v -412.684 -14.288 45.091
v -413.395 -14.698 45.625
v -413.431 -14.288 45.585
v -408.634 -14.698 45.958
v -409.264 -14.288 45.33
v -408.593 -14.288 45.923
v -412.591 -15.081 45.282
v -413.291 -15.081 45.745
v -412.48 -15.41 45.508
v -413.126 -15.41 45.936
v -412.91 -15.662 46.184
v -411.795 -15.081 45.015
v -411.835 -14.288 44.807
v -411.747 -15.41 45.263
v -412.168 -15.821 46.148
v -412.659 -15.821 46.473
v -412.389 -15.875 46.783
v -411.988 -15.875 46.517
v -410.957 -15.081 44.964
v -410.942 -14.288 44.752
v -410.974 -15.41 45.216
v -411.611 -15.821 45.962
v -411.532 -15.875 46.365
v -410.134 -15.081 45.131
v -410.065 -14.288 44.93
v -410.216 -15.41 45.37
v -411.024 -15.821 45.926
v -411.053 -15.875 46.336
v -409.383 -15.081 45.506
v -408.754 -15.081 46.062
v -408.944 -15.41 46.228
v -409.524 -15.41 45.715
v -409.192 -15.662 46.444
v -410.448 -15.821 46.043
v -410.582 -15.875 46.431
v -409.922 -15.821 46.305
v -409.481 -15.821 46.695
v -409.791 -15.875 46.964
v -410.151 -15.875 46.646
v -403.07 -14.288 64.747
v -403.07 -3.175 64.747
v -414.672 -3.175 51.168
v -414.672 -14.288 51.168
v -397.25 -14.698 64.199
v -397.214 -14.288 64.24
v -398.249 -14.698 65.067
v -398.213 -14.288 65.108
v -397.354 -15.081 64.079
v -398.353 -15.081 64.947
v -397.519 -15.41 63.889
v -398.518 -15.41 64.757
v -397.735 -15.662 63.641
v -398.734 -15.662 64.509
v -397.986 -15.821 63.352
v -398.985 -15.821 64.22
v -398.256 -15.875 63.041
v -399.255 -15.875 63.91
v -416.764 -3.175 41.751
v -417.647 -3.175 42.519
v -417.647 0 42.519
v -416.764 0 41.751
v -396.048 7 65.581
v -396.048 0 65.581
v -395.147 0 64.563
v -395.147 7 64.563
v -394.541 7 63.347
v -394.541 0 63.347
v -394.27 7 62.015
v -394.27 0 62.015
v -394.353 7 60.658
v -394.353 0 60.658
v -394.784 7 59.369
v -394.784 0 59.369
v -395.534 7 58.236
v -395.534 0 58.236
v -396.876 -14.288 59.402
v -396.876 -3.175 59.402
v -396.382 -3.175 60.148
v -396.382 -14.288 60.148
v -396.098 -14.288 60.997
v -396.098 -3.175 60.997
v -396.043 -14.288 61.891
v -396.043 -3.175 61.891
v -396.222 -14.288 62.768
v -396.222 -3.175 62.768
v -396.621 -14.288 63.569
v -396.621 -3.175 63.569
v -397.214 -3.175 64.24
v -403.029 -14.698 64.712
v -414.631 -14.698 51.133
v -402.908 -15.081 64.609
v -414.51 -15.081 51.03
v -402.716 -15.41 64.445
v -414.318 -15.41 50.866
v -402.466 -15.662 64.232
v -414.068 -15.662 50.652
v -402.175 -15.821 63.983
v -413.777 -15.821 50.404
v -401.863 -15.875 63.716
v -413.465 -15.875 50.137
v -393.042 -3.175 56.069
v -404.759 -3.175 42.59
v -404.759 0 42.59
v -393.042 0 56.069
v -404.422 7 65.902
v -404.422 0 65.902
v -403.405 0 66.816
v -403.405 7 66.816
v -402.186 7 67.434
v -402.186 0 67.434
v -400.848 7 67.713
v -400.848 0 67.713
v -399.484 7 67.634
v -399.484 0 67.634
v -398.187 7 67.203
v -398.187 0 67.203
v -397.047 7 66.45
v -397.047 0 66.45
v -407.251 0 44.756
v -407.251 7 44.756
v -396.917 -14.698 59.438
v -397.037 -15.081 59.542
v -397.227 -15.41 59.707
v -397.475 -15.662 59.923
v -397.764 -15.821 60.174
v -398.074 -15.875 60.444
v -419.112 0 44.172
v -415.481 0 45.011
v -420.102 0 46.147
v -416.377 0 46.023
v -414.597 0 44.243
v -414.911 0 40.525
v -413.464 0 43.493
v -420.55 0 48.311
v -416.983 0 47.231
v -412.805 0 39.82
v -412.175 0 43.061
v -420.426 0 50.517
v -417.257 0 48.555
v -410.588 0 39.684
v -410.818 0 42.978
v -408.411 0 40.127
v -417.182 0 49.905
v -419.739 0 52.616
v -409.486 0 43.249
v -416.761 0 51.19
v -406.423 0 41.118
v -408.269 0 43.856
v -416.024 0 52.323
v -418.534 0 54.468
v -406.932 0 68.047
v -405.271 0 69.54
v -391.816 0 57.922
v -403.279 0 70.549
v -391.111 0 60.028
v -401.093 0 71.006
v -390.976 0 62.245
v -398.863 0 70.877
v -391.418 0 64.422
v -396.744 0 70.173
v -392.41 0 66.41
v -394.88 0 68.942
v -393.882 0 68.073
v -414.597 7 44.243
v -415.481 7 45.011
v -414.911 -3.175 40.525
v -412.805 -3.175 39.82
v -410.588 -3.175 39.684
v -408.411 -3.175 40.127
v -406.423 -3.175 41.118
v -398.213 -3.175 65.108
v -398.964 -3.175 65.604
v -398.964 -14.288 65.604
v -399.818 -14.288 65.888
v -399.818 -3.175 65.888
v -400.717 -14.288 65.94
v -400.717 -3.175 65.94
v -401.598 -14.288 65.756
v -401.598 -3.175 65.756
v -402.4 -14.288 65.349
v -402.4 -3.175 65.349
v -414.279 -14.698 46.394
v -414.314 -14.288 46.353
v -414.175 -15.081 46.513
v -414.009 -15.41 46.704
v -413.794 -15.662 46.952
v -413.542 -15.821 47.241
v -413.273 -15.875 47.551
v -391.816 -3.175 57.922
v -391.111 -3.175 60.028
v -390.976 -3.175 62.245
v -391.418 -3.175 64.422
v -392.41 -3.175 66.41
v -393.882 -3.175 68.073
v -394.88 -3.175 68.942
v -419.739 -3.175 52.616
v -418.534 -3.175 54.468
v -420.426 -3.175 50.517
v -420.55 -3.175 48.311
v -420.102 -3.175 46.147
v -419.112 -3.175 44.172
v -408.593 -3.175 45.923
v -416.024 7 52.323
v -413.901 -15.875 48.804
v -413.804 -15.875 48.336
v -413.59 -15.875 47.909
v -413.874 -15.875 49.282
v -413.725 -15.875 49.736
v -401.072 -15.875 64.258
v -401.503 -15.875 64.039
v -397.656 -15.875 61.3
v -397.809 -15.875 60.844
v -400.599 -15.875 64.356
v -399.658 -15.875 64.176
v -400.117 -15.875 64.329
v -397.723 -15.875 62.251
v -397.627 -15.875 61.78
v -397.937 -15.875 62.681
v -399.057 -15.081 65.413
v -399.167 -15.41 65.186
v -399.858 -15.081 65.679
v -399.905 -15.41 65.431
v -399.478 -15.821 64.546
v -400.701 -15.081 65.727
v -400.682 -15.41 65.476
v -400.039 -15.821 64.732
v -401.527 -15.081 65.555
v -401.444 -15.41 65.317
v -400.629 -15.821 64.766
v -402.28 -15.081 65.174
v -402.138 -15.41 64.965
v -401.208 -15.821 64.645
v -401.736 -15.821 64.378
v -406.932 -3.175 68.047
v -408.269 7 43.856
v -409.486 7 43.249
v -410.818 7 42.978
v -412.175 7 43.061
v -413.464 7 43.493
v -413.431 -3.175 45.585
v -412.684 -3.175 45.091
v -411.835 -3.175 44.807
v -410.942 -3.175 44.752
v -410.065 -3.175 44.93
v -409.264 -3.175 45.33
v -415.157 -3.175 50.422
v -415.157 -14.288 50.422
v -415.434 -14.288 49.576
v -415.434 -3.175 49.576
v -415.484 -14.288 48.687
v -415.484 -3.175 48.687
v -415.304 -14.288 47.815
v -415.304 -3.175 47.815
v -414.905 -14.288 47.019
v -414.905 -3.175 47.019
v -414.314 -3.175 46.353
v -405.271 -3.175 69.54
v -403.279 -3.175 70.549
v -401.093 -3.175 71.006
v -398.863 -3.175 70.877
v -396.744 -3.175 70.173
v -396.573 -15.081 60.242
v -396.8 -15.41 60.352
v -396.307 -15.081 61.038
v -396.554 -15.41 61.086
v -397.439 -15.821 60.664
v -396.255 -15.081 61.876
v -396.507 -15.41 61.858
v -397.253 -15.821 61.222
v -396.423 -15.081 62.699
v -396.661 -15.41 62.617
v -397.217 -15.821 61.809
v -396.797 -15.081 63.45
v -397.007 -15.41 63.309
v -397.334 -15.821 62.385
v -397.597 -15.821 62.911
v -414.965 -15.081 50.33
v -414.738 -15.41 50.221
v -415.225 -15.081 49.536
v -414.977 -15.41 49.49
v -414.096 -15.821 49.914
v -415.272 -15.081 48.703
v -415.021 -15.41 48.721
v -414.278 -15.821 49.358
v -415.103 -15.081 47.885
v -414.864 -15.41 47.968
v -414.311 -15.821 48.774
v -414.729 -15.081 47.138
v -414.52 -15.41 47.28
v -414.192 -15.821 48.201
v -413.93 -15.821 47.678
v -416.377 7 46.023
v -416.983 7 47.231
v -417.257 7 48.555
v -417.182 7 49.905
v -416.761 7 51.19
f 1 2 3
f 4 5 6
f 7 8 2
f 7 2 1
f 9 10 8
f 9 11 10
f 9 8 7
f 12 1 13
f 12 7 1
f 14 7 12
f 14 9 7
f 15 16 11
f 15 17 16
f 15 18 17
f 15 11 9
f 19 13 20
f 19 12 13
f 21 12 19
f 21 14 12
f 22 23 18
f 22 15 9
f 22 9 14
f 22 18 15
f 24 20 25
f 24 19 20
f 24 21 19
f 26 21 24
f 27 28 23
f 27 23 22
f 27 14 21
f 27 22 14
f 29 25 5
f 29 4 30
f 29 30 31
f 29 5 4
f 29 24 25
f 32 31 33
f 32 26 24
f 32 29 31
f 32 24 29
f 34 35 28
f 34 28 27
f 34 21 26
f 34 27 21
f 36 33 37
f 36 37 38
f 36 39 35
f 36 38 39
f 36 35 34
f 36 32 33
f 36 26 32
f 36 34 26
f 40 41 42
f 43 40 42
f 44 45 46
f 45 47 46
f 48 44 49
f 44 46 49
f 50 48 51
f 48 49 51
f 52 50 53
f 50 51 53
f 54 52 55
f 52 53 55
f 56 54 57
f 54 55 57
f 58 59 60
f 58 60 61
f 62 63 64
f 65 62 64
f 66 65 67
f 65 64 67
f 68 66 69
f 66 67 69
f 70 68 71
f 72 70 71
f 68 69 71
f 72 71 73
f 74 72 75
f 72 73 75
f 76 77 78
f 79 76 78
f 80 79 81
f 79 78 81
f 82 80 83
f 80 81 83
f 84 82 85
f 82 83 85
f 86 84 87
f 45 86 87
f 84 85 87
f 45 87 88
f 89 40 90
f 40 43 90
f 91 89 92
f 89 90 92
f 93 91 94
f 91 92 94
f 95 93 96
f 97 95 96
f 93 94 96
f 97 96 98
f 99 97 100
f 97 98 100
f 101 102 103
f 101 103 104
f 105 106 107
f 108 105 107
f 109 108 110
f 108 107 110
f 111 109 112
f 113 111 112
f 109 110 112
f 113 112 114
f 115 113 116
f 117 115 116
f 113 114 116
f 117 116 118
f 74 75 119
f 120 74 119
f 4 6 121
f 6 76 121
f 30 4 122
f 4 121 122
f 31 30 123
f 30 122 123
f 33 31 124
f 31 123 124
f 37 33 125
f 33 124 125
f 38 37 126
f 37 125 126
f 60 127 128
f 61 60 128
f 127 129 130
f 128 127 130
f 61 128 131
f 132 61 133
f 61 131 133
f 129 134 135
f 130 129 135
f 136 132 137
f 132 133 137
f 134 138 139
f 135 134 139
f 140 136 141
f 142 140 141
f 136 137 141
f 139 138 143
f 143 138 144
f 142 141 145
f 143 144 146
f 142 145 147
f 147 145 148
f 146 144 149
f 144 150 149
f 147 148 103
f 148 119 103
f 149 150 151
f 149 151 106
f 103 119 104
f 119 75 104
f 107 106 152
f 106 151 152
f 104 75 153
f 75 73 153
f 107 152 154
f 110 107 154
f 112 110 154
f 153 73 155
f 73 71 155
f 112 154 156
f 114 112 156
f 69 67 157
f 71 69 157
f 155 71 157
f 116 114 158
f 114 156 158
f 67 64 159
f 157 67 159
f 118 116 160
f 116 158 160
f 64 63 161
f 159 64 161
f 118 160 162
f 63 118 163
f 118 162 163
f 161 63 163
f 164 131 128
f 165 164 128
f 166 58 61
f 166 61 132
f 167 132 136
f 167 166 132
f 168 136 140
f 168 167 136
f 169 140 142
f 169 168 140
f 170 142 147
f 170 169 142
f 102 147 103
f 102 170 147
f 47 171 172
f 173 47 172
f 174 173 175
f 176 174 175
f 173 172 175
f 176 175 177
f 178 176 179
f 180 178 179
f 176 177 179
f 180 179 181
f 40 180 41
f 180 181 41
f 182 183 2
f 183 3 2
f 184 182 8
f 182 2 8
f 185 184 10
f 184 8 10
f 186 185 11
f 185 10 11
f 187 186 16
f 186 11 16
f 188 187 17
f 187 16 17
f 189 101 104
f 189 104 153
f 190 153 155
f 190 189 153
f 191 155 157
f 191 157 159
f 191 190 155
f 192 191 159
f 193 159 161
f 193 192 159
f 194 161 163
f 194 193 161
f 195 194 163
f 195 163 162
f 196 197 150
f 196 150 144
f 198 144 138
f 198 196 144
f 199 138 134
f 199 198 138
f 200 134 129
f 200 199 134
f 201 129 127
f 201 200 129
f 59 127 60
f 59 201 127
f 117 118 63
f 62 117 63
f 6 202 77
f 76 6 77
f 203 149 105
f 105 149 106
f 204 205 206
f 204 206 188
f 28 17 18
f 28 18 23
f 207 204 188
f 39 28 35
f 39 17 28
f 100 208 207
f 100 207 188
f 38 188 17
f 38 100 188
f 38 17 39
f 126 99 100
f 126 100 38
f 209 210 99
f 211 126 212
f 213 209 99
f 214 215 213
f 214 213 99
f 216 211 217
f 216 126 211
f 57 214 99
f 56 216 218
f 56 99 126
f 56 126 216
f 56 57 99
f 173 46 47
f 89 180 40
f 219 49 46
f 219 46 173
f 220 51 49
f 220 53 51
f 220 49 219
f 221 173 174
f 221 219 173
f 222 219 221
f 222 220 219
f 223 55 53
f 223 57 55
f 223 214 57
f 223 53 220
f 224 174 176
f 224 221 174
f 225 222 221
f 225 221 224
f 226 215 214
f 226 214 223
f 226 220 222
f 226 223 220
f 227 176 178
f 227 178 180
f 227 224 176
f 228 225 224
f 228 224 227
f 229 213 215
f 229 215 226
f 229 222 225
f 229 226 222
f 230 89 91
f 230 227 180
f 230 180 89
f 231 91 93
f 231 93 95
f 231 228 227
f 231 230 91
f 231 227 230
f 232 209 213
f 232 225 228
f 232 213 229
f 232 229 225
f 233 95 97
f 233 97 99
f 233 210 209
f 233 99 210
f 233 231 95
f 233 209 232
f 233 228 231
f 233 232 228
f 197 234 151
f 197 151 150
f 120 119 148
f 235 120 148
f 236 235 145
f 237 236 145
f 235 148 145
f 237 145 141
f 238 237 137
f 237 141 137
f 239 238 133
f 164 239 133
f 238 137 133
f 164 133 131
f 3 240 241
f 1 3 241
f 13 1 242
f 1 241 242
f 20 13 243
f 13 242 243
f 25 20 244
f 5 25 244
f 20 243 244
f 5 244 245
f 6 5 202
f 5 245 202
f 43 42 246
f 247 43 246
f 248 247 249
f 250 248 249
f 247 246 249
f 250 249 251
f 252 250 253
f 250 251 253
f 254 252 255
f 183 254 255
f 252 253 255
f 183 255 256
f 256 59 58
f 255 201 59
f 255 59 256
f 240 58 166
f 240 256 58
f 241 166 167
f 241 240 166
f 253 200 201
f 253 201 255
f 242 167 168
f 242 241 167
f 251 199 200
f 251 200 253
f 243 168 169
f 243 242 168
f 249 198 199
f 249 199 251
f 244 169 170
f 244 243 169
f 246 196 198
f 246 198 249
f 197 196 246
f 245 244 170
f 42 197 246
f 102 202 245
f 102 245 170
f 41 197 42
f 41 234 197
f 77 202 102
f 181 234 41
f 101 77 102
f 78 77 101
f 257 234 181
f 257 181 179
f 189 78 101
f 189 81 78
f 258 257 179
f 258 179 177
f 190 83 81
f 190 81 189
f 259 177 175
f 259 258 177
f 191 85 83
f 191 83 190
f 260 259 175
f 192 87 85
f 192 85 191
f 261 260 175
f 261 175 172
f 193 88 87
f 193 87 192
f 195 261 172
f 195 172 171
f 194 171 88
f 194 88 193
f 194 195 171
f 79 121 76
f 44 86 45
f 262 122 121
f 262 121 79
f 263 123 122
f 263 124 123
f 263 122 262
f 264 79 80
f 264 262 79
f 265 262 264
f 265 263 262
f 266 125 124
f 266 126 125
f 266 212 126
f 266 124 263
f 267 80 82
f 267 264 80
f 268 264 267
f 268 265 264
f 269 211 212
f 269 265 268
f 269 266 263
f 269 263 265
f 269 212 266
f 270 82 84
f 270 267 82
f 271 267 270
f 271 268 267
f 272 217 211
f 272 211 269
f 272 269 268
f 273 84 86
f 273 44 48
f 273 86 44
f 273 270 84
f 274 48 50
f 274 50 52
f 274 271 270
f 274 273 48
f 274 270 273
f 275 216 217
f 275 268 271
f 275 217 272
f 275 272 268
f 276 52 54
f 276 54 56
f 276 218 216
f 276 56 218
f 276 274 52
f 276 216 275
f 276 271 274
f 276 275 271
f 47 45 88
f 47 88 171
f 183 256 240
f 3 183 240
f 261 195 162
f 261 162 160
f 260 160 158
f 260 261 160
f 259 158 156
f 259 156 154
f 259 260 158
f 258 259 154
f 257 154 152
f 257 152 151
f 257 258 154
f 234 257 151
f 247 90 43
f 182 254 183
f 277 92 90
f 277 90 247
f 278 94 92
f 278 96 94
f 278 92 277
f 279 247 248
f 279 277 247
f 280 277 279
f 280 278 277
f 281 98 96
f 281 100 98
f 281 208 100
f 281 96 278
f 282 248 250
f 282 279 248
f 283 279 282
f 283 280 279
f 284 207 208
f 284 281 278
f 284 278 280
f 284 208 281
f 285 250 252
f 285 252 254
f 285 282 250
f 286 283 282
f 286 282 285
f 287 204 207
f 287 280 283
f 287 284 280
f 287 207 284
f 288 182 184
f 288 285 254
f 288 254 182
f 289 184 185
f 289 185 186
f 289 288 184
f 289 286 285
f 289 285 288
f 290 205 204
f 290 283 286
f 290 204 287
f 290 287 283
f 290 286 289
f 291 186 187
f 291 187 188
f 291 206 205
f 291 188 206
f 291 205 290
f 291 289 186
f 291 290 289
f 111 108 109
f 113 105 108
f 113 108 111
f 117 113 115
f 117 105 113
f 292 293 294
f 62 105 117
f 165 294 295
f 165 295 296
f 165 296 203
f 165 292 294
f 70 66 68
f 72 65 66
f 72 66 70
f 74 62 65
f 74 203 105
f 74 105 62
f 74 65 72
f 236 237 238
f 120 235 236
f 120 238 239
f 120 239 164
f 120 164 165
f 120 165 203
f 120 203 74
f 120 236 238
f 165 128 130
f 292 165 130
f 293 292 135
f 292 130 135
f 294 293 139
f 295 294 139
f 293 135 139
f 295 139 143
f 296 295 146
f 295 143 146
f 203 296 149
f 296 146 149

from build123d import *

# Parameters (mm, degrees)
BOSS_EXTRUDE1_DEPTH = 7
BOSS_EXTRUDE3_START = 3.175
BOSS_EXTRUDE3_DEPTH = 3.175
BOSS_EXTRUDE4_DEPTH = 12.7
FILLET2_R           = 1.5875


with BuildPart() as part:
    # Sketch1 → Boss-Extrude1 (new body)
    # profile 1 of 2: a face of its own
    with BuildSketch(Plane(origin=(0, 0, 0), x_dir=(1, 0, 0), z_dir=(0, 1, 0))):
        with BuildLine():
            Line((-397.046660629, -66.449724392), (-396.047807587, -65.58143469))
            ThreePointArc((-396.047807587, -65.58143469), (-394.269590942, -62.014883864), (-395.534134167, -58.235562542))
            Line((-395.534134167, -58.235562542), (-407.251348425, -44.756449439))
            ThreePointArc((-407.251348425, -44.756449439), (-410.81789925, -42.978232793), (-414.597220573, -44.242776019))
            Line((-414.597220573, -44.242776019), (-415.480745161, -45.010812225))
            ThreePointArc((-415.480745161, -45.010812225), (-417.25736044, -48.555145476), (-416.023502117, -52.322937096))
            Line((-416.023502117, -52.322937096), (-404.421616313, -65.902303694))
            ThreePointArc((-404.421616313, -65.902303694), (-400.848199526, -67.712666251), (-397.046660629, -66.449724392))
        make_face()
        with BuildLine():
            ThreePointArc((-396.131127084, -65.485586573), (-394.396281576, -62.006024792), (-395.629982284, -58.318882038))
            Line((-395.629982284, -58.318882038), (-407.347196542, -44.839768935))
            ThreePointArc((-407.347196542, -44.839768935), (-410.826758322, -43.104923427), (-414.513901076, -44.338624135))
            Line((-414.513901076, -44.338624135), (-415.397425664, -45.106660342))
            ThreePointArc((-415.397425664, -45.106660342), (-417.130708863, -48.564546441), (-415.926944646, -52.240440703))
            Line((-415.926944646, -52.240440703), (-404.325058842, -65.819807301))
            ThreePointArc((-404.325058842, -65.819807301), (-400.838798562, -67.586014674), (-397.129980126, -66.353876275))
            Line((-397.129980126, -66.353876275), (-396.131127084, -65.485586573))
        make_face(mode=Mode.SUBTRACT)
    # profile 2 of 2: a face of its own
    with BuildSketch(Plane(origin=(0, 0, 0), x_dir=(1, 0, 0), z_dir=(0, 1, 0))):
        with BuildLine():
            Line((-397.129980126, -66.353876275), (-396.131127084, -65.485586573))
            ThreePointArc((-396.131127084, -65.485586573), (-394.396281576, -62.006024792), (-395.629982284, -58.318882038))
            Line((-395.629982284, -58.318882038), (-407.347196542, -44.839768935))
            ThreePointArc((-407.347196542, -44.839768935), (-410.826758322, -43.104923427), (-414.513901076, -44.338624135))
            Line((-414.513901076, -44.338624135), (-415.397425664, -45.106660342))
            ThreePointArc((-415.397425664, -45.106660342), (-417.130708863, -48.564546441), (-415.926944646, -52.240440703))
            Line((-415.926944646, -52.240440703), (-404.325058842, -65.819807301))
            ThreePointArc((-404.325058842, -65.819807301), (-400.838798562, -67.586014674), (-397.129980126, -66.353876275))
        make_face()
    extrude(amount=BOSS_EXTRUDE1_DEPTH)

    # Sketch3 → Boss-Extrude3 (add)
    # profile 1 of 2: a face of its own
    with BuildSketch(Plane.XZ.offset(BOSS_EXTRUDE3_START)):
        with BuildLine():
            Line((-393.881500674, 68.073485724), (-394.880353715, 68.941775426))
            ThreePointArc((-394.880353715, 68.941775426), (-401.092624596, 71.005607244), (-406.932110565, 68.047209895))
            Line((-406.932110565, 68.047209895), (-418.533996369, 54.467843297))
            ThreePointArc((-418.533996369, 54.467843297), (-420.550301433, 48.310720407), (-417.647052074, 42.518761191))
            Line((-417.647052074, 42.518761191), (-416.763527487, 41.750724985))
            ThreePointArc((-416.763527487, 41.750724985), (-410.587563374, 39.684276299), (-404.759297391, 42.590142525))
            Line((-404.759297391, 42.590142525), (-393.042083133, 56.069255628))
            ThreePointArc((-393.042083133, 56.069255628), (-390.975634448, 62.245219741), (-393.881500674, 68.073485724))
        make_face()
        with BuildLine():
            Line((-396.047807587, 65.58143469), (-397.046660629, 66.449724392))
            ThreePointArc((-397.046660629, 66.449724392), (-400.848199526, 67.712666251), (-404.421616313, 65.902303694))
            Line((-404.421616313, 65.902303694), (-416.023502117, 52.322937096))
            ThreePointArc((-416.023502117, 52.322937096), (-417.25736044, 48.555145476), (-415.480745161, 45.010812225))
            Line((-415.480745161, 45.010812225), (-414.597220573, 44.242776019))
            ThreePointArc((-414.597220573, 44.242776019), (-410.81789925, 42.978232793), (-407.251348425, 44.756449439))
            Line((-407.251348425, 44.756449439), (-395.534134167, 58.235562542))
            ThreePointArc((-395.534134167, 58.235562542), (-394.269590942, 62.014883864), (-396.047807587, 65.58143469))
        make_face(mode=Mode.SUBTRACT)
    # profile 2 of 2: a face of its own
    with BuildSketch(Plane.XZ.offset(BOSS_EXTRUDE3_START)):
        with BuildLine():
            ThreePointArc((-395.534134167, 58.235562542), (-394.269590942, 62.014883864), (-396.047807587, 65.58143469))
            Line((-396.047807587, 65.58143469), (-397.046660629, 66.449724392))
            ThreePointArc((-397.046660629, 66.449724392), (-400.848199526, 67.712666251), (-404.421616313, 65.902303694))
            Line((-404.421616313, 65.902303694), (-416.023502117, 52.322937096))
            ThreePointArc((-416.023502117, 52.322937096), (-417.25736044, 48.555145476), (-415.480745161, 45.010812225))
            Line((-415.480745161, 45.010812225), (-414.597220573, 44.242776019))
            ThreePointArc((-414.597220573, 44.242776019), (-410.81789925, 42.978232793), (-407.251348425, 44.756449439))
            Line((-407.251348425, 44.756449439), (-395.534134167, 58.235562542))
        make_face()
    extrude(amount=-BOSS_EXTRUDE3_DEPTH)

    # Sketch4 → Boss-Extrude4 (add)
    with BuildSketch(Plane.XZ.offset(3.175)):
        with BuildLine():
            Line((-397.214280541, 64.239561056), (-398.213133583, 65.107850758))
            ThreePointArc((-398.213133583, 65.107850758), (-400.716586027, 65.939544178), (-403.069811716, 64.747354201))
            Line((-403.069811716, 64.747354201), (-414.67169752, 51.167987603))
            ThreePointArc((-414.67169752, 51.167987603), (-415.484238367, 48.686758975), (-414.314272207, 46.352685859))
            Line((-414.314272207, 46.352685859), (-413.430747619, 45.584649652))
            ThreePointArc((-413.430747619, 45.584649652), (-410.941926261, 44.751901674), (-408.593222058, 45.922922392))
            Line((-408.593222058, 45.922922392), (-396.876007801, 59.402035495))
            ThreePointArc((-396.876007801, 59.402035495), (-396.043259823, 61.890856854), (-397.214280541, 64.239561056))
        make_face()
    extrude(amount=BOSS_EXTRUDE4_DEPTH)

    # Fillet2
    fillet2_edges = [part.edges().sort_by_distance(p)[0] for p in [
        (-397.713707062, -15.875, 64.673705907),
        (-400.716586027, -15.875, 65.939544178),
        (-408.870754618, -15.875, 57.957670902),
        (-415.484238367, -15.875, 48.686758975),
        (-413.872509913, -15.875, 45.968667755),
        (-410.941926261, -15.875, 44.751901674),
        (-402.73461493, -15.875, 52.662478944),
        (-396.043259823, -15.875, 61.890856854),
    ]]
    fillet(fillet2_edges, radius=FILLET2_R)


solid = part.part
